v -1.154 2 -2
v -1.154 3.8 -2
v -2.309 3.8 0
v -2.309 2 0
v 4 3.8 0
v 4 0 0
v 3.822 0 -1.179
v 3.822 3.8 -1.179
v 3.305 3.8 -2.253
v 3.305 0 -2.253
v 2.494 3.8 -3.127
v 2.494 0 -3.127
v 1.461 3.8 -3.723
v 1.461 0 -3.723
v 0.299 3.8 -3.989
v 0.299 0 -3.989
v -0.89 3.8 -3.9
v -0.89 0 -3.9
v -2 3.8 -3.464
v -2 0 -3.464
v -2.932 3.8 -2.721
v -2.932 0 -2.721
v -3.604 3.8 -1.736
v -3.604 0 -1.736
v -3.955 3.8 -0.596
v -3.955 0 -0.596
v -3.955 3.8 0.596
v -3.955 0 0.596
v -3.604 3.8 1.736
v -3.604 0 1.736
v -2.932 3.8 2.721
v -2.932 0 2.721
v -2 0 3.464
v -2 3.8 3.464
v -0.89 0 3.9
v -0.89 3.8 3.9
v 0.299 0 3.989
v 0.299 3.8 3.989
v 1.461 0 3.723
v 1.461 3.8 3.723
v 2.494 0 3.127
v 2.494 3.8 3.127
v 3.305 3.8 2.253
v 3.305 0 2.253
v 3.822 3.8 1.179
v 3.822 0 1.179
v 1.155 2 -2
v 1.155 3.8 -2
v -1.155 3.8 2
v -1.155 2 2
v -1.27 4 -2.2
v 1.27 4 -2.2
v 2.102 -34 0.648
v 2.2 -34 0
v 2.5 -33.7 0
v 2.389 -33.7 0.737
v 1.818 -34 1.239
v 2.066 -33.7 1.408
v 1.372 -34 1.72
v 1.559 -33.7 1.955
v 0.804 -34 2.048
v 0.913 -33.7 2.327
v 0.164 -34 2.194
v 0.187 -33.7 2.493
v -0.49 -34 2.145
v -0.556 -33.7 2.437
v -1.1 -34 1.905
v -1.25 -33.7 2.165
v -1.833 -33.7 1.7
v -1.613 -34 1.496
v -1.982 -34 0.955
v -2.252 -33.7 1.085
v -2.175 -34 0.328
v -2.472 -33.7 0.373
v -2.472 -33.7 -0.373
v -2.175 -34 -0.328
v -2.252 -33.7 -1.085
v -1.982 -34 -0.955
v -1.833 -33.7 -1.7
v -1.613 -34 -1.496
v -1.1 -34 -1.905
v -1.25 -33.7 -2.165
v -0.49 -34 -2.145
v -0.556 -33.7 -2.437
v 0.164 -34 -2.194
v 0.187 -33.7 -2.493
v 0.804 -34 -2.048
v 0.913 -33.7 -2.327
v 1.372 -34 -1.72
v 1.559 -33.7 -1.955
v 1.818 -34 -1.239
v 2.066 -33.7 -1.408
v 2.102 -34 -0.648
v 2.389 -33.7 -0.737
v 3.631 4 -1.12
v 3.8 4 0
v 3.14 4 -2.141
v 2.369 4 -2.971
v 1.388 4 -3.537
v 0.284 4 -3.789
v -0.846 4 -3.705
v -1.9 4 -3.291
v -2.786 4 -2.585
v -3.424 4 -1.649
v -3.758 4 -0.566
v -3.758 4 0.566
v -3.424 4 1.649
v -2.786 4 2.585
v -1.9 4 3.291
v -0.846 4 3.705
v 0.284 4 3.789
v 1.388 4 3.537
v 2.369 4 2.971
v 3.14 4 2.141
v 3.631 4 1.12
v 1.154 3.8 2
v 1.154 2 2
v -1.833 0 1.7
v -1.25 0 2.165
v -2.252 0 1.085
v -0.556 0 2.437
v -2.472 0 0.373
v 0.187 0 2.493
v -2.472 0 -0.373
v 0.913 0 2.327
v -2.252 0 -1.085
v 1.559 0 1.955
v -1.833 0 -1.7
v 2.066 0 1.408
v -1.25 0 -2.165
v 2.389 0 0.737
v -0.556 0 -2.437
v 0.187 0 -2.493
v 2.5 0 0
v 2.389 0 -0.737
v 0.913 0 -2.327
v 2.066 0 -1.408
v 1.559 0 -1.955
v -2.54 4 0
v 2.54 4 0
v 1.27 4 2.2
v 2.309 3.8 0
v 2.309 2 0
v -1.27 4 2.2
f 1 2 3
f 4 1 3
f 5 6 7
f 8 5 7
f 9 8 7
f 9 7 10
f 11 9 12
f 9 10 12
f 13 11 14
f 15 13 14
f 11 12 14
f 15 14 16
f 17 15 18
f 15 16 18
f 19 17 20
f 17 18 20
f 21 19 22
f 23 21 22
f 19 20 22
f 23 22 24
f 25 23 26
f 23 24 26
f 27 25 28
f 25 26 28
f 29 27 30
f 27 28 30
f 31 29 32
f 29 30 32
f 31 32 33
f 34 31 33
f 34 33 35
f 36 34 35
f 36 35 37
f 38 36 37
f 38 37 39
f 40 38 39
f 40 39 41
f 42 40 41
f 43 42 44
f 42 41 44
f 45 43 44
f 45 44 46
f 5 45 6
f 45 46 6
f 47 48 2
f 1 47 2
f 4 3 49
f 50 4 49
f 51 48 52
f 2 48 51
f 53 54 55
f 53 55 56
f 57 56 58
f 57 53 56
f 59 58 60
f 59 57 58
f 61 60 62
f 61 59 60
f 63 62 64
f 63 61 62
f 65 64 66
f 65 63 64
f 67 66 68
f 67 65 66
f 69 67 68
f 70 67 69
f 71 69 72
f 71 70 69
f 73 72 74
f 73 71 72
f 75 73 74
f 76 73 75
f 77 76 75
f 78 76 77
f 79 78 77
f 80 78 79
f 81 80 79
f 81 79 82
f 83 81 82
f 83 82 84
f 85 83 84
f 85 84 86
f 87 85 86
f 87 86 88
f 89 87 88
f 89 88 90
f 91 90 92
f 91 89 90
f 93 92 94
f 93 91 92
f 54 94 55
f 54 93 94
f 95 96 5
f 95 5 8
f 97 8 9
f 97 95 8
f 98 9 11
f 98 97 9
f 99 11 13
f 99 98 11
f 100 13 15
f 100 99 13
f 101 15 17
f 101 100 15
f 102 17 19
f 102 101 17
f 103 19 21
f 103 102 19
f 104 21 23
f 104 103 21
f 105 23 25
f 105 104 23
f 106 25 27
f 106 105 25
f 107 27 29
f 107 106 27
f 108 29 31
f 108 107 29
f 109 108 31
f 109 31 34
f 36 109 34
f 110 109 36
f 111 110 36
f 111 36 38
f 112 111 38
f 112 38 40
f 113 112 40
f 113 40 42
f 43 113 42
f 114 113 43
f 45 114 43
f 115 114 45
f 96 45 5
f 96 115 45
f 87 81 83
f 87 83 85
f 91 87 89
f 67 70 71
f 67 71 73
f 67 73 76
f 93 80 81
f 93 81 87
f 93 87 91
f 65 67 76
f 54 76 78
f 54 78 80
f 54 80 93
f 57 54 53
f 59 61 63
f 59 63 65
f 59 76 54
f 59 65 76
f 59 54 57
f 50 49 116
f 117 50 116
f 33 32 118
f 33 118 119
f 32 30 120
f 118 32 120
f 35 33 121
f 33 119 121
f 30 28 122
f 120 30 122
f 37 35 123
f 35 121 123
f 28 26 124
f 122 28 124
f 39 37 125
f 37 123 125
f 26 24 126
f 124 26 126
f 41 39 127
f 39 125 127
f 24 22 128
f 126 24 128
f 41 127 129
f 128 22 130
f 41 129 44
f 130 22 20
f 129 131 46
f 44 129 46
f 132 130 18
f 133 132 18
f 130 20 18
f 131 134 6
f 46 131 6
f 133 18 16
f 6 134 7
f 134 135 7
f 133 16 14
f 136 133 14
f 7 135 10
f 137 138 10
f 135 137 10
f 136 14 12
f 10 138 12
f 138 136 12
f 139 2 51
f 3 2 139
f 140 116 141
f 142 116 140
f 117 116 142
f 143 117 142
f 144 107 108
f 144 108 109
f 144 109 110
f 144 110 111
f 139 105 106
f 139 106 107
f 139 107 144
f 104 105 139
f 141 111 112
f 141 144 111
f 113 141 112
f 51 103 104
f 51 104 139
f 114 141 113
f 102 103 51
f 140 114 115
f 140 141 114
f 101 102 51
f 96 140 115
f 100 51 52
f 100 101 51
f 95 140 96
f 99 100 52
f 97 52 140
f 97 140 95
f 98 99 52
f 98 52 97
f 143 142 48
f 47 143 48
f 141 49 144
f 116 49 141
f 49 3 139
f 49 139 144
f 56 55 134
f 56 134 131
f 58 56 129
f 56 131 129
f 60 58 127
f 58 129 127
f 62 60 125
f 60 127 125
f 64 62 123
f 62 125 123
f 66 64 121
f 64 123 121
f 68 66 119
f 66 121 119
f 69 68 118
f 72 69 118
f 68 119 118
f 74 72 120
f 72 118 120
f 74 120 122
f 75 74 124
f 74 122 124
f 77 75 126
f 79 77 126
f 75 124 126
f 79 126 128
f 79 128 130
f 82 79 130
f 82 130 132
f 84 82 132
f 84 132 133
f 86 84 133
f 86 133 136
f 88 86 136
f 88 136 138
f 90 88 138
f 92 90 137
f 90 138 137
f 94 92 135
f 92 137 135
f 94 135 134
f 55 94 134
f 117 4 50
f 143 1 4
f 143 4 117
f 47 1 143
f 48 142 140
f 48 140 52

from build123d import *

# Parameters (mm, degrees)
SKETCH_1_R          = 4
EXTRUDE_1_DEPTH     = 4
SKETCH_2_R          = 2.5
EXTRUDE_2_DEPTH     = 34
CUT_EXTRUDE_1_DEPTH = 2
CHAMFER_1_SIZE      = 0.2
CHAMFER_2_SIZE      = 0.3


with BuildPart() as part:
    # 草图1 → 凸台-拉伸1 (new body)
    with BuildSketch(Plane(origin=(0, 0, 0), x_dir=(1, 0, 0), z_dir=(0, 1, 0))):
        Circle(SKETCH_1_R)
    extrude(amount=EXTRUDE_1_DEPTH)

    # 草图2 → 凸台-拉伸2 (add)
    with BuildSketch(Plane.XZ):
        Circle(SKETCH_2_R)
    extrude(amount=EXTRUDE_2_DEPTH)

    # 草图11 → 切除-拉伸1 (cut)
    with BuildSketch(Plane(origin=(0, 4, 0), x_dir=(1, 0, 0), z_dir=(0, 1, 0))):
        Polygon((1.154954177, 1.999853541), (-1.154446882, 2.000146427), (-2.309401058, 0.000292887), (-1.154954177, -1.999853541), (1.154446882, -2.000146427), (2.309401058, -0.000292887), align=None)
    extrude(amount=-CUT_EXTRUDE_1_DEPTH, mode=Mode.SUBTRACT)

    # 倒角1
    chamfer_1_edges = [part.edges().sort_by_distance(p)[0] for p in [
        (1.732177617, 4, -0.999780327),
        (0.000253647, 4, -1.999999984),
        (-1.73192397, 4, -1.000219657),
        (-1.732177617, 4, 0.999780327),
        (-0.000253647, 4, 1.999999984),
        (1.73192397, 4, 1.000219657),
        (-4, 4, 0),
    ]]
    chamfer(chamfer_1_edges, length=CHAMFER_1_SIZE)

    # 倒角2
    chamfer_2_edges = [part.edges().sort_by_distance(p)[0] for p in [
        (-2.5, -34, 0),
    ]]
    chamfer(chamfer_2_edges, length=CHAMFER_2_SIZE)


solid = part.part
